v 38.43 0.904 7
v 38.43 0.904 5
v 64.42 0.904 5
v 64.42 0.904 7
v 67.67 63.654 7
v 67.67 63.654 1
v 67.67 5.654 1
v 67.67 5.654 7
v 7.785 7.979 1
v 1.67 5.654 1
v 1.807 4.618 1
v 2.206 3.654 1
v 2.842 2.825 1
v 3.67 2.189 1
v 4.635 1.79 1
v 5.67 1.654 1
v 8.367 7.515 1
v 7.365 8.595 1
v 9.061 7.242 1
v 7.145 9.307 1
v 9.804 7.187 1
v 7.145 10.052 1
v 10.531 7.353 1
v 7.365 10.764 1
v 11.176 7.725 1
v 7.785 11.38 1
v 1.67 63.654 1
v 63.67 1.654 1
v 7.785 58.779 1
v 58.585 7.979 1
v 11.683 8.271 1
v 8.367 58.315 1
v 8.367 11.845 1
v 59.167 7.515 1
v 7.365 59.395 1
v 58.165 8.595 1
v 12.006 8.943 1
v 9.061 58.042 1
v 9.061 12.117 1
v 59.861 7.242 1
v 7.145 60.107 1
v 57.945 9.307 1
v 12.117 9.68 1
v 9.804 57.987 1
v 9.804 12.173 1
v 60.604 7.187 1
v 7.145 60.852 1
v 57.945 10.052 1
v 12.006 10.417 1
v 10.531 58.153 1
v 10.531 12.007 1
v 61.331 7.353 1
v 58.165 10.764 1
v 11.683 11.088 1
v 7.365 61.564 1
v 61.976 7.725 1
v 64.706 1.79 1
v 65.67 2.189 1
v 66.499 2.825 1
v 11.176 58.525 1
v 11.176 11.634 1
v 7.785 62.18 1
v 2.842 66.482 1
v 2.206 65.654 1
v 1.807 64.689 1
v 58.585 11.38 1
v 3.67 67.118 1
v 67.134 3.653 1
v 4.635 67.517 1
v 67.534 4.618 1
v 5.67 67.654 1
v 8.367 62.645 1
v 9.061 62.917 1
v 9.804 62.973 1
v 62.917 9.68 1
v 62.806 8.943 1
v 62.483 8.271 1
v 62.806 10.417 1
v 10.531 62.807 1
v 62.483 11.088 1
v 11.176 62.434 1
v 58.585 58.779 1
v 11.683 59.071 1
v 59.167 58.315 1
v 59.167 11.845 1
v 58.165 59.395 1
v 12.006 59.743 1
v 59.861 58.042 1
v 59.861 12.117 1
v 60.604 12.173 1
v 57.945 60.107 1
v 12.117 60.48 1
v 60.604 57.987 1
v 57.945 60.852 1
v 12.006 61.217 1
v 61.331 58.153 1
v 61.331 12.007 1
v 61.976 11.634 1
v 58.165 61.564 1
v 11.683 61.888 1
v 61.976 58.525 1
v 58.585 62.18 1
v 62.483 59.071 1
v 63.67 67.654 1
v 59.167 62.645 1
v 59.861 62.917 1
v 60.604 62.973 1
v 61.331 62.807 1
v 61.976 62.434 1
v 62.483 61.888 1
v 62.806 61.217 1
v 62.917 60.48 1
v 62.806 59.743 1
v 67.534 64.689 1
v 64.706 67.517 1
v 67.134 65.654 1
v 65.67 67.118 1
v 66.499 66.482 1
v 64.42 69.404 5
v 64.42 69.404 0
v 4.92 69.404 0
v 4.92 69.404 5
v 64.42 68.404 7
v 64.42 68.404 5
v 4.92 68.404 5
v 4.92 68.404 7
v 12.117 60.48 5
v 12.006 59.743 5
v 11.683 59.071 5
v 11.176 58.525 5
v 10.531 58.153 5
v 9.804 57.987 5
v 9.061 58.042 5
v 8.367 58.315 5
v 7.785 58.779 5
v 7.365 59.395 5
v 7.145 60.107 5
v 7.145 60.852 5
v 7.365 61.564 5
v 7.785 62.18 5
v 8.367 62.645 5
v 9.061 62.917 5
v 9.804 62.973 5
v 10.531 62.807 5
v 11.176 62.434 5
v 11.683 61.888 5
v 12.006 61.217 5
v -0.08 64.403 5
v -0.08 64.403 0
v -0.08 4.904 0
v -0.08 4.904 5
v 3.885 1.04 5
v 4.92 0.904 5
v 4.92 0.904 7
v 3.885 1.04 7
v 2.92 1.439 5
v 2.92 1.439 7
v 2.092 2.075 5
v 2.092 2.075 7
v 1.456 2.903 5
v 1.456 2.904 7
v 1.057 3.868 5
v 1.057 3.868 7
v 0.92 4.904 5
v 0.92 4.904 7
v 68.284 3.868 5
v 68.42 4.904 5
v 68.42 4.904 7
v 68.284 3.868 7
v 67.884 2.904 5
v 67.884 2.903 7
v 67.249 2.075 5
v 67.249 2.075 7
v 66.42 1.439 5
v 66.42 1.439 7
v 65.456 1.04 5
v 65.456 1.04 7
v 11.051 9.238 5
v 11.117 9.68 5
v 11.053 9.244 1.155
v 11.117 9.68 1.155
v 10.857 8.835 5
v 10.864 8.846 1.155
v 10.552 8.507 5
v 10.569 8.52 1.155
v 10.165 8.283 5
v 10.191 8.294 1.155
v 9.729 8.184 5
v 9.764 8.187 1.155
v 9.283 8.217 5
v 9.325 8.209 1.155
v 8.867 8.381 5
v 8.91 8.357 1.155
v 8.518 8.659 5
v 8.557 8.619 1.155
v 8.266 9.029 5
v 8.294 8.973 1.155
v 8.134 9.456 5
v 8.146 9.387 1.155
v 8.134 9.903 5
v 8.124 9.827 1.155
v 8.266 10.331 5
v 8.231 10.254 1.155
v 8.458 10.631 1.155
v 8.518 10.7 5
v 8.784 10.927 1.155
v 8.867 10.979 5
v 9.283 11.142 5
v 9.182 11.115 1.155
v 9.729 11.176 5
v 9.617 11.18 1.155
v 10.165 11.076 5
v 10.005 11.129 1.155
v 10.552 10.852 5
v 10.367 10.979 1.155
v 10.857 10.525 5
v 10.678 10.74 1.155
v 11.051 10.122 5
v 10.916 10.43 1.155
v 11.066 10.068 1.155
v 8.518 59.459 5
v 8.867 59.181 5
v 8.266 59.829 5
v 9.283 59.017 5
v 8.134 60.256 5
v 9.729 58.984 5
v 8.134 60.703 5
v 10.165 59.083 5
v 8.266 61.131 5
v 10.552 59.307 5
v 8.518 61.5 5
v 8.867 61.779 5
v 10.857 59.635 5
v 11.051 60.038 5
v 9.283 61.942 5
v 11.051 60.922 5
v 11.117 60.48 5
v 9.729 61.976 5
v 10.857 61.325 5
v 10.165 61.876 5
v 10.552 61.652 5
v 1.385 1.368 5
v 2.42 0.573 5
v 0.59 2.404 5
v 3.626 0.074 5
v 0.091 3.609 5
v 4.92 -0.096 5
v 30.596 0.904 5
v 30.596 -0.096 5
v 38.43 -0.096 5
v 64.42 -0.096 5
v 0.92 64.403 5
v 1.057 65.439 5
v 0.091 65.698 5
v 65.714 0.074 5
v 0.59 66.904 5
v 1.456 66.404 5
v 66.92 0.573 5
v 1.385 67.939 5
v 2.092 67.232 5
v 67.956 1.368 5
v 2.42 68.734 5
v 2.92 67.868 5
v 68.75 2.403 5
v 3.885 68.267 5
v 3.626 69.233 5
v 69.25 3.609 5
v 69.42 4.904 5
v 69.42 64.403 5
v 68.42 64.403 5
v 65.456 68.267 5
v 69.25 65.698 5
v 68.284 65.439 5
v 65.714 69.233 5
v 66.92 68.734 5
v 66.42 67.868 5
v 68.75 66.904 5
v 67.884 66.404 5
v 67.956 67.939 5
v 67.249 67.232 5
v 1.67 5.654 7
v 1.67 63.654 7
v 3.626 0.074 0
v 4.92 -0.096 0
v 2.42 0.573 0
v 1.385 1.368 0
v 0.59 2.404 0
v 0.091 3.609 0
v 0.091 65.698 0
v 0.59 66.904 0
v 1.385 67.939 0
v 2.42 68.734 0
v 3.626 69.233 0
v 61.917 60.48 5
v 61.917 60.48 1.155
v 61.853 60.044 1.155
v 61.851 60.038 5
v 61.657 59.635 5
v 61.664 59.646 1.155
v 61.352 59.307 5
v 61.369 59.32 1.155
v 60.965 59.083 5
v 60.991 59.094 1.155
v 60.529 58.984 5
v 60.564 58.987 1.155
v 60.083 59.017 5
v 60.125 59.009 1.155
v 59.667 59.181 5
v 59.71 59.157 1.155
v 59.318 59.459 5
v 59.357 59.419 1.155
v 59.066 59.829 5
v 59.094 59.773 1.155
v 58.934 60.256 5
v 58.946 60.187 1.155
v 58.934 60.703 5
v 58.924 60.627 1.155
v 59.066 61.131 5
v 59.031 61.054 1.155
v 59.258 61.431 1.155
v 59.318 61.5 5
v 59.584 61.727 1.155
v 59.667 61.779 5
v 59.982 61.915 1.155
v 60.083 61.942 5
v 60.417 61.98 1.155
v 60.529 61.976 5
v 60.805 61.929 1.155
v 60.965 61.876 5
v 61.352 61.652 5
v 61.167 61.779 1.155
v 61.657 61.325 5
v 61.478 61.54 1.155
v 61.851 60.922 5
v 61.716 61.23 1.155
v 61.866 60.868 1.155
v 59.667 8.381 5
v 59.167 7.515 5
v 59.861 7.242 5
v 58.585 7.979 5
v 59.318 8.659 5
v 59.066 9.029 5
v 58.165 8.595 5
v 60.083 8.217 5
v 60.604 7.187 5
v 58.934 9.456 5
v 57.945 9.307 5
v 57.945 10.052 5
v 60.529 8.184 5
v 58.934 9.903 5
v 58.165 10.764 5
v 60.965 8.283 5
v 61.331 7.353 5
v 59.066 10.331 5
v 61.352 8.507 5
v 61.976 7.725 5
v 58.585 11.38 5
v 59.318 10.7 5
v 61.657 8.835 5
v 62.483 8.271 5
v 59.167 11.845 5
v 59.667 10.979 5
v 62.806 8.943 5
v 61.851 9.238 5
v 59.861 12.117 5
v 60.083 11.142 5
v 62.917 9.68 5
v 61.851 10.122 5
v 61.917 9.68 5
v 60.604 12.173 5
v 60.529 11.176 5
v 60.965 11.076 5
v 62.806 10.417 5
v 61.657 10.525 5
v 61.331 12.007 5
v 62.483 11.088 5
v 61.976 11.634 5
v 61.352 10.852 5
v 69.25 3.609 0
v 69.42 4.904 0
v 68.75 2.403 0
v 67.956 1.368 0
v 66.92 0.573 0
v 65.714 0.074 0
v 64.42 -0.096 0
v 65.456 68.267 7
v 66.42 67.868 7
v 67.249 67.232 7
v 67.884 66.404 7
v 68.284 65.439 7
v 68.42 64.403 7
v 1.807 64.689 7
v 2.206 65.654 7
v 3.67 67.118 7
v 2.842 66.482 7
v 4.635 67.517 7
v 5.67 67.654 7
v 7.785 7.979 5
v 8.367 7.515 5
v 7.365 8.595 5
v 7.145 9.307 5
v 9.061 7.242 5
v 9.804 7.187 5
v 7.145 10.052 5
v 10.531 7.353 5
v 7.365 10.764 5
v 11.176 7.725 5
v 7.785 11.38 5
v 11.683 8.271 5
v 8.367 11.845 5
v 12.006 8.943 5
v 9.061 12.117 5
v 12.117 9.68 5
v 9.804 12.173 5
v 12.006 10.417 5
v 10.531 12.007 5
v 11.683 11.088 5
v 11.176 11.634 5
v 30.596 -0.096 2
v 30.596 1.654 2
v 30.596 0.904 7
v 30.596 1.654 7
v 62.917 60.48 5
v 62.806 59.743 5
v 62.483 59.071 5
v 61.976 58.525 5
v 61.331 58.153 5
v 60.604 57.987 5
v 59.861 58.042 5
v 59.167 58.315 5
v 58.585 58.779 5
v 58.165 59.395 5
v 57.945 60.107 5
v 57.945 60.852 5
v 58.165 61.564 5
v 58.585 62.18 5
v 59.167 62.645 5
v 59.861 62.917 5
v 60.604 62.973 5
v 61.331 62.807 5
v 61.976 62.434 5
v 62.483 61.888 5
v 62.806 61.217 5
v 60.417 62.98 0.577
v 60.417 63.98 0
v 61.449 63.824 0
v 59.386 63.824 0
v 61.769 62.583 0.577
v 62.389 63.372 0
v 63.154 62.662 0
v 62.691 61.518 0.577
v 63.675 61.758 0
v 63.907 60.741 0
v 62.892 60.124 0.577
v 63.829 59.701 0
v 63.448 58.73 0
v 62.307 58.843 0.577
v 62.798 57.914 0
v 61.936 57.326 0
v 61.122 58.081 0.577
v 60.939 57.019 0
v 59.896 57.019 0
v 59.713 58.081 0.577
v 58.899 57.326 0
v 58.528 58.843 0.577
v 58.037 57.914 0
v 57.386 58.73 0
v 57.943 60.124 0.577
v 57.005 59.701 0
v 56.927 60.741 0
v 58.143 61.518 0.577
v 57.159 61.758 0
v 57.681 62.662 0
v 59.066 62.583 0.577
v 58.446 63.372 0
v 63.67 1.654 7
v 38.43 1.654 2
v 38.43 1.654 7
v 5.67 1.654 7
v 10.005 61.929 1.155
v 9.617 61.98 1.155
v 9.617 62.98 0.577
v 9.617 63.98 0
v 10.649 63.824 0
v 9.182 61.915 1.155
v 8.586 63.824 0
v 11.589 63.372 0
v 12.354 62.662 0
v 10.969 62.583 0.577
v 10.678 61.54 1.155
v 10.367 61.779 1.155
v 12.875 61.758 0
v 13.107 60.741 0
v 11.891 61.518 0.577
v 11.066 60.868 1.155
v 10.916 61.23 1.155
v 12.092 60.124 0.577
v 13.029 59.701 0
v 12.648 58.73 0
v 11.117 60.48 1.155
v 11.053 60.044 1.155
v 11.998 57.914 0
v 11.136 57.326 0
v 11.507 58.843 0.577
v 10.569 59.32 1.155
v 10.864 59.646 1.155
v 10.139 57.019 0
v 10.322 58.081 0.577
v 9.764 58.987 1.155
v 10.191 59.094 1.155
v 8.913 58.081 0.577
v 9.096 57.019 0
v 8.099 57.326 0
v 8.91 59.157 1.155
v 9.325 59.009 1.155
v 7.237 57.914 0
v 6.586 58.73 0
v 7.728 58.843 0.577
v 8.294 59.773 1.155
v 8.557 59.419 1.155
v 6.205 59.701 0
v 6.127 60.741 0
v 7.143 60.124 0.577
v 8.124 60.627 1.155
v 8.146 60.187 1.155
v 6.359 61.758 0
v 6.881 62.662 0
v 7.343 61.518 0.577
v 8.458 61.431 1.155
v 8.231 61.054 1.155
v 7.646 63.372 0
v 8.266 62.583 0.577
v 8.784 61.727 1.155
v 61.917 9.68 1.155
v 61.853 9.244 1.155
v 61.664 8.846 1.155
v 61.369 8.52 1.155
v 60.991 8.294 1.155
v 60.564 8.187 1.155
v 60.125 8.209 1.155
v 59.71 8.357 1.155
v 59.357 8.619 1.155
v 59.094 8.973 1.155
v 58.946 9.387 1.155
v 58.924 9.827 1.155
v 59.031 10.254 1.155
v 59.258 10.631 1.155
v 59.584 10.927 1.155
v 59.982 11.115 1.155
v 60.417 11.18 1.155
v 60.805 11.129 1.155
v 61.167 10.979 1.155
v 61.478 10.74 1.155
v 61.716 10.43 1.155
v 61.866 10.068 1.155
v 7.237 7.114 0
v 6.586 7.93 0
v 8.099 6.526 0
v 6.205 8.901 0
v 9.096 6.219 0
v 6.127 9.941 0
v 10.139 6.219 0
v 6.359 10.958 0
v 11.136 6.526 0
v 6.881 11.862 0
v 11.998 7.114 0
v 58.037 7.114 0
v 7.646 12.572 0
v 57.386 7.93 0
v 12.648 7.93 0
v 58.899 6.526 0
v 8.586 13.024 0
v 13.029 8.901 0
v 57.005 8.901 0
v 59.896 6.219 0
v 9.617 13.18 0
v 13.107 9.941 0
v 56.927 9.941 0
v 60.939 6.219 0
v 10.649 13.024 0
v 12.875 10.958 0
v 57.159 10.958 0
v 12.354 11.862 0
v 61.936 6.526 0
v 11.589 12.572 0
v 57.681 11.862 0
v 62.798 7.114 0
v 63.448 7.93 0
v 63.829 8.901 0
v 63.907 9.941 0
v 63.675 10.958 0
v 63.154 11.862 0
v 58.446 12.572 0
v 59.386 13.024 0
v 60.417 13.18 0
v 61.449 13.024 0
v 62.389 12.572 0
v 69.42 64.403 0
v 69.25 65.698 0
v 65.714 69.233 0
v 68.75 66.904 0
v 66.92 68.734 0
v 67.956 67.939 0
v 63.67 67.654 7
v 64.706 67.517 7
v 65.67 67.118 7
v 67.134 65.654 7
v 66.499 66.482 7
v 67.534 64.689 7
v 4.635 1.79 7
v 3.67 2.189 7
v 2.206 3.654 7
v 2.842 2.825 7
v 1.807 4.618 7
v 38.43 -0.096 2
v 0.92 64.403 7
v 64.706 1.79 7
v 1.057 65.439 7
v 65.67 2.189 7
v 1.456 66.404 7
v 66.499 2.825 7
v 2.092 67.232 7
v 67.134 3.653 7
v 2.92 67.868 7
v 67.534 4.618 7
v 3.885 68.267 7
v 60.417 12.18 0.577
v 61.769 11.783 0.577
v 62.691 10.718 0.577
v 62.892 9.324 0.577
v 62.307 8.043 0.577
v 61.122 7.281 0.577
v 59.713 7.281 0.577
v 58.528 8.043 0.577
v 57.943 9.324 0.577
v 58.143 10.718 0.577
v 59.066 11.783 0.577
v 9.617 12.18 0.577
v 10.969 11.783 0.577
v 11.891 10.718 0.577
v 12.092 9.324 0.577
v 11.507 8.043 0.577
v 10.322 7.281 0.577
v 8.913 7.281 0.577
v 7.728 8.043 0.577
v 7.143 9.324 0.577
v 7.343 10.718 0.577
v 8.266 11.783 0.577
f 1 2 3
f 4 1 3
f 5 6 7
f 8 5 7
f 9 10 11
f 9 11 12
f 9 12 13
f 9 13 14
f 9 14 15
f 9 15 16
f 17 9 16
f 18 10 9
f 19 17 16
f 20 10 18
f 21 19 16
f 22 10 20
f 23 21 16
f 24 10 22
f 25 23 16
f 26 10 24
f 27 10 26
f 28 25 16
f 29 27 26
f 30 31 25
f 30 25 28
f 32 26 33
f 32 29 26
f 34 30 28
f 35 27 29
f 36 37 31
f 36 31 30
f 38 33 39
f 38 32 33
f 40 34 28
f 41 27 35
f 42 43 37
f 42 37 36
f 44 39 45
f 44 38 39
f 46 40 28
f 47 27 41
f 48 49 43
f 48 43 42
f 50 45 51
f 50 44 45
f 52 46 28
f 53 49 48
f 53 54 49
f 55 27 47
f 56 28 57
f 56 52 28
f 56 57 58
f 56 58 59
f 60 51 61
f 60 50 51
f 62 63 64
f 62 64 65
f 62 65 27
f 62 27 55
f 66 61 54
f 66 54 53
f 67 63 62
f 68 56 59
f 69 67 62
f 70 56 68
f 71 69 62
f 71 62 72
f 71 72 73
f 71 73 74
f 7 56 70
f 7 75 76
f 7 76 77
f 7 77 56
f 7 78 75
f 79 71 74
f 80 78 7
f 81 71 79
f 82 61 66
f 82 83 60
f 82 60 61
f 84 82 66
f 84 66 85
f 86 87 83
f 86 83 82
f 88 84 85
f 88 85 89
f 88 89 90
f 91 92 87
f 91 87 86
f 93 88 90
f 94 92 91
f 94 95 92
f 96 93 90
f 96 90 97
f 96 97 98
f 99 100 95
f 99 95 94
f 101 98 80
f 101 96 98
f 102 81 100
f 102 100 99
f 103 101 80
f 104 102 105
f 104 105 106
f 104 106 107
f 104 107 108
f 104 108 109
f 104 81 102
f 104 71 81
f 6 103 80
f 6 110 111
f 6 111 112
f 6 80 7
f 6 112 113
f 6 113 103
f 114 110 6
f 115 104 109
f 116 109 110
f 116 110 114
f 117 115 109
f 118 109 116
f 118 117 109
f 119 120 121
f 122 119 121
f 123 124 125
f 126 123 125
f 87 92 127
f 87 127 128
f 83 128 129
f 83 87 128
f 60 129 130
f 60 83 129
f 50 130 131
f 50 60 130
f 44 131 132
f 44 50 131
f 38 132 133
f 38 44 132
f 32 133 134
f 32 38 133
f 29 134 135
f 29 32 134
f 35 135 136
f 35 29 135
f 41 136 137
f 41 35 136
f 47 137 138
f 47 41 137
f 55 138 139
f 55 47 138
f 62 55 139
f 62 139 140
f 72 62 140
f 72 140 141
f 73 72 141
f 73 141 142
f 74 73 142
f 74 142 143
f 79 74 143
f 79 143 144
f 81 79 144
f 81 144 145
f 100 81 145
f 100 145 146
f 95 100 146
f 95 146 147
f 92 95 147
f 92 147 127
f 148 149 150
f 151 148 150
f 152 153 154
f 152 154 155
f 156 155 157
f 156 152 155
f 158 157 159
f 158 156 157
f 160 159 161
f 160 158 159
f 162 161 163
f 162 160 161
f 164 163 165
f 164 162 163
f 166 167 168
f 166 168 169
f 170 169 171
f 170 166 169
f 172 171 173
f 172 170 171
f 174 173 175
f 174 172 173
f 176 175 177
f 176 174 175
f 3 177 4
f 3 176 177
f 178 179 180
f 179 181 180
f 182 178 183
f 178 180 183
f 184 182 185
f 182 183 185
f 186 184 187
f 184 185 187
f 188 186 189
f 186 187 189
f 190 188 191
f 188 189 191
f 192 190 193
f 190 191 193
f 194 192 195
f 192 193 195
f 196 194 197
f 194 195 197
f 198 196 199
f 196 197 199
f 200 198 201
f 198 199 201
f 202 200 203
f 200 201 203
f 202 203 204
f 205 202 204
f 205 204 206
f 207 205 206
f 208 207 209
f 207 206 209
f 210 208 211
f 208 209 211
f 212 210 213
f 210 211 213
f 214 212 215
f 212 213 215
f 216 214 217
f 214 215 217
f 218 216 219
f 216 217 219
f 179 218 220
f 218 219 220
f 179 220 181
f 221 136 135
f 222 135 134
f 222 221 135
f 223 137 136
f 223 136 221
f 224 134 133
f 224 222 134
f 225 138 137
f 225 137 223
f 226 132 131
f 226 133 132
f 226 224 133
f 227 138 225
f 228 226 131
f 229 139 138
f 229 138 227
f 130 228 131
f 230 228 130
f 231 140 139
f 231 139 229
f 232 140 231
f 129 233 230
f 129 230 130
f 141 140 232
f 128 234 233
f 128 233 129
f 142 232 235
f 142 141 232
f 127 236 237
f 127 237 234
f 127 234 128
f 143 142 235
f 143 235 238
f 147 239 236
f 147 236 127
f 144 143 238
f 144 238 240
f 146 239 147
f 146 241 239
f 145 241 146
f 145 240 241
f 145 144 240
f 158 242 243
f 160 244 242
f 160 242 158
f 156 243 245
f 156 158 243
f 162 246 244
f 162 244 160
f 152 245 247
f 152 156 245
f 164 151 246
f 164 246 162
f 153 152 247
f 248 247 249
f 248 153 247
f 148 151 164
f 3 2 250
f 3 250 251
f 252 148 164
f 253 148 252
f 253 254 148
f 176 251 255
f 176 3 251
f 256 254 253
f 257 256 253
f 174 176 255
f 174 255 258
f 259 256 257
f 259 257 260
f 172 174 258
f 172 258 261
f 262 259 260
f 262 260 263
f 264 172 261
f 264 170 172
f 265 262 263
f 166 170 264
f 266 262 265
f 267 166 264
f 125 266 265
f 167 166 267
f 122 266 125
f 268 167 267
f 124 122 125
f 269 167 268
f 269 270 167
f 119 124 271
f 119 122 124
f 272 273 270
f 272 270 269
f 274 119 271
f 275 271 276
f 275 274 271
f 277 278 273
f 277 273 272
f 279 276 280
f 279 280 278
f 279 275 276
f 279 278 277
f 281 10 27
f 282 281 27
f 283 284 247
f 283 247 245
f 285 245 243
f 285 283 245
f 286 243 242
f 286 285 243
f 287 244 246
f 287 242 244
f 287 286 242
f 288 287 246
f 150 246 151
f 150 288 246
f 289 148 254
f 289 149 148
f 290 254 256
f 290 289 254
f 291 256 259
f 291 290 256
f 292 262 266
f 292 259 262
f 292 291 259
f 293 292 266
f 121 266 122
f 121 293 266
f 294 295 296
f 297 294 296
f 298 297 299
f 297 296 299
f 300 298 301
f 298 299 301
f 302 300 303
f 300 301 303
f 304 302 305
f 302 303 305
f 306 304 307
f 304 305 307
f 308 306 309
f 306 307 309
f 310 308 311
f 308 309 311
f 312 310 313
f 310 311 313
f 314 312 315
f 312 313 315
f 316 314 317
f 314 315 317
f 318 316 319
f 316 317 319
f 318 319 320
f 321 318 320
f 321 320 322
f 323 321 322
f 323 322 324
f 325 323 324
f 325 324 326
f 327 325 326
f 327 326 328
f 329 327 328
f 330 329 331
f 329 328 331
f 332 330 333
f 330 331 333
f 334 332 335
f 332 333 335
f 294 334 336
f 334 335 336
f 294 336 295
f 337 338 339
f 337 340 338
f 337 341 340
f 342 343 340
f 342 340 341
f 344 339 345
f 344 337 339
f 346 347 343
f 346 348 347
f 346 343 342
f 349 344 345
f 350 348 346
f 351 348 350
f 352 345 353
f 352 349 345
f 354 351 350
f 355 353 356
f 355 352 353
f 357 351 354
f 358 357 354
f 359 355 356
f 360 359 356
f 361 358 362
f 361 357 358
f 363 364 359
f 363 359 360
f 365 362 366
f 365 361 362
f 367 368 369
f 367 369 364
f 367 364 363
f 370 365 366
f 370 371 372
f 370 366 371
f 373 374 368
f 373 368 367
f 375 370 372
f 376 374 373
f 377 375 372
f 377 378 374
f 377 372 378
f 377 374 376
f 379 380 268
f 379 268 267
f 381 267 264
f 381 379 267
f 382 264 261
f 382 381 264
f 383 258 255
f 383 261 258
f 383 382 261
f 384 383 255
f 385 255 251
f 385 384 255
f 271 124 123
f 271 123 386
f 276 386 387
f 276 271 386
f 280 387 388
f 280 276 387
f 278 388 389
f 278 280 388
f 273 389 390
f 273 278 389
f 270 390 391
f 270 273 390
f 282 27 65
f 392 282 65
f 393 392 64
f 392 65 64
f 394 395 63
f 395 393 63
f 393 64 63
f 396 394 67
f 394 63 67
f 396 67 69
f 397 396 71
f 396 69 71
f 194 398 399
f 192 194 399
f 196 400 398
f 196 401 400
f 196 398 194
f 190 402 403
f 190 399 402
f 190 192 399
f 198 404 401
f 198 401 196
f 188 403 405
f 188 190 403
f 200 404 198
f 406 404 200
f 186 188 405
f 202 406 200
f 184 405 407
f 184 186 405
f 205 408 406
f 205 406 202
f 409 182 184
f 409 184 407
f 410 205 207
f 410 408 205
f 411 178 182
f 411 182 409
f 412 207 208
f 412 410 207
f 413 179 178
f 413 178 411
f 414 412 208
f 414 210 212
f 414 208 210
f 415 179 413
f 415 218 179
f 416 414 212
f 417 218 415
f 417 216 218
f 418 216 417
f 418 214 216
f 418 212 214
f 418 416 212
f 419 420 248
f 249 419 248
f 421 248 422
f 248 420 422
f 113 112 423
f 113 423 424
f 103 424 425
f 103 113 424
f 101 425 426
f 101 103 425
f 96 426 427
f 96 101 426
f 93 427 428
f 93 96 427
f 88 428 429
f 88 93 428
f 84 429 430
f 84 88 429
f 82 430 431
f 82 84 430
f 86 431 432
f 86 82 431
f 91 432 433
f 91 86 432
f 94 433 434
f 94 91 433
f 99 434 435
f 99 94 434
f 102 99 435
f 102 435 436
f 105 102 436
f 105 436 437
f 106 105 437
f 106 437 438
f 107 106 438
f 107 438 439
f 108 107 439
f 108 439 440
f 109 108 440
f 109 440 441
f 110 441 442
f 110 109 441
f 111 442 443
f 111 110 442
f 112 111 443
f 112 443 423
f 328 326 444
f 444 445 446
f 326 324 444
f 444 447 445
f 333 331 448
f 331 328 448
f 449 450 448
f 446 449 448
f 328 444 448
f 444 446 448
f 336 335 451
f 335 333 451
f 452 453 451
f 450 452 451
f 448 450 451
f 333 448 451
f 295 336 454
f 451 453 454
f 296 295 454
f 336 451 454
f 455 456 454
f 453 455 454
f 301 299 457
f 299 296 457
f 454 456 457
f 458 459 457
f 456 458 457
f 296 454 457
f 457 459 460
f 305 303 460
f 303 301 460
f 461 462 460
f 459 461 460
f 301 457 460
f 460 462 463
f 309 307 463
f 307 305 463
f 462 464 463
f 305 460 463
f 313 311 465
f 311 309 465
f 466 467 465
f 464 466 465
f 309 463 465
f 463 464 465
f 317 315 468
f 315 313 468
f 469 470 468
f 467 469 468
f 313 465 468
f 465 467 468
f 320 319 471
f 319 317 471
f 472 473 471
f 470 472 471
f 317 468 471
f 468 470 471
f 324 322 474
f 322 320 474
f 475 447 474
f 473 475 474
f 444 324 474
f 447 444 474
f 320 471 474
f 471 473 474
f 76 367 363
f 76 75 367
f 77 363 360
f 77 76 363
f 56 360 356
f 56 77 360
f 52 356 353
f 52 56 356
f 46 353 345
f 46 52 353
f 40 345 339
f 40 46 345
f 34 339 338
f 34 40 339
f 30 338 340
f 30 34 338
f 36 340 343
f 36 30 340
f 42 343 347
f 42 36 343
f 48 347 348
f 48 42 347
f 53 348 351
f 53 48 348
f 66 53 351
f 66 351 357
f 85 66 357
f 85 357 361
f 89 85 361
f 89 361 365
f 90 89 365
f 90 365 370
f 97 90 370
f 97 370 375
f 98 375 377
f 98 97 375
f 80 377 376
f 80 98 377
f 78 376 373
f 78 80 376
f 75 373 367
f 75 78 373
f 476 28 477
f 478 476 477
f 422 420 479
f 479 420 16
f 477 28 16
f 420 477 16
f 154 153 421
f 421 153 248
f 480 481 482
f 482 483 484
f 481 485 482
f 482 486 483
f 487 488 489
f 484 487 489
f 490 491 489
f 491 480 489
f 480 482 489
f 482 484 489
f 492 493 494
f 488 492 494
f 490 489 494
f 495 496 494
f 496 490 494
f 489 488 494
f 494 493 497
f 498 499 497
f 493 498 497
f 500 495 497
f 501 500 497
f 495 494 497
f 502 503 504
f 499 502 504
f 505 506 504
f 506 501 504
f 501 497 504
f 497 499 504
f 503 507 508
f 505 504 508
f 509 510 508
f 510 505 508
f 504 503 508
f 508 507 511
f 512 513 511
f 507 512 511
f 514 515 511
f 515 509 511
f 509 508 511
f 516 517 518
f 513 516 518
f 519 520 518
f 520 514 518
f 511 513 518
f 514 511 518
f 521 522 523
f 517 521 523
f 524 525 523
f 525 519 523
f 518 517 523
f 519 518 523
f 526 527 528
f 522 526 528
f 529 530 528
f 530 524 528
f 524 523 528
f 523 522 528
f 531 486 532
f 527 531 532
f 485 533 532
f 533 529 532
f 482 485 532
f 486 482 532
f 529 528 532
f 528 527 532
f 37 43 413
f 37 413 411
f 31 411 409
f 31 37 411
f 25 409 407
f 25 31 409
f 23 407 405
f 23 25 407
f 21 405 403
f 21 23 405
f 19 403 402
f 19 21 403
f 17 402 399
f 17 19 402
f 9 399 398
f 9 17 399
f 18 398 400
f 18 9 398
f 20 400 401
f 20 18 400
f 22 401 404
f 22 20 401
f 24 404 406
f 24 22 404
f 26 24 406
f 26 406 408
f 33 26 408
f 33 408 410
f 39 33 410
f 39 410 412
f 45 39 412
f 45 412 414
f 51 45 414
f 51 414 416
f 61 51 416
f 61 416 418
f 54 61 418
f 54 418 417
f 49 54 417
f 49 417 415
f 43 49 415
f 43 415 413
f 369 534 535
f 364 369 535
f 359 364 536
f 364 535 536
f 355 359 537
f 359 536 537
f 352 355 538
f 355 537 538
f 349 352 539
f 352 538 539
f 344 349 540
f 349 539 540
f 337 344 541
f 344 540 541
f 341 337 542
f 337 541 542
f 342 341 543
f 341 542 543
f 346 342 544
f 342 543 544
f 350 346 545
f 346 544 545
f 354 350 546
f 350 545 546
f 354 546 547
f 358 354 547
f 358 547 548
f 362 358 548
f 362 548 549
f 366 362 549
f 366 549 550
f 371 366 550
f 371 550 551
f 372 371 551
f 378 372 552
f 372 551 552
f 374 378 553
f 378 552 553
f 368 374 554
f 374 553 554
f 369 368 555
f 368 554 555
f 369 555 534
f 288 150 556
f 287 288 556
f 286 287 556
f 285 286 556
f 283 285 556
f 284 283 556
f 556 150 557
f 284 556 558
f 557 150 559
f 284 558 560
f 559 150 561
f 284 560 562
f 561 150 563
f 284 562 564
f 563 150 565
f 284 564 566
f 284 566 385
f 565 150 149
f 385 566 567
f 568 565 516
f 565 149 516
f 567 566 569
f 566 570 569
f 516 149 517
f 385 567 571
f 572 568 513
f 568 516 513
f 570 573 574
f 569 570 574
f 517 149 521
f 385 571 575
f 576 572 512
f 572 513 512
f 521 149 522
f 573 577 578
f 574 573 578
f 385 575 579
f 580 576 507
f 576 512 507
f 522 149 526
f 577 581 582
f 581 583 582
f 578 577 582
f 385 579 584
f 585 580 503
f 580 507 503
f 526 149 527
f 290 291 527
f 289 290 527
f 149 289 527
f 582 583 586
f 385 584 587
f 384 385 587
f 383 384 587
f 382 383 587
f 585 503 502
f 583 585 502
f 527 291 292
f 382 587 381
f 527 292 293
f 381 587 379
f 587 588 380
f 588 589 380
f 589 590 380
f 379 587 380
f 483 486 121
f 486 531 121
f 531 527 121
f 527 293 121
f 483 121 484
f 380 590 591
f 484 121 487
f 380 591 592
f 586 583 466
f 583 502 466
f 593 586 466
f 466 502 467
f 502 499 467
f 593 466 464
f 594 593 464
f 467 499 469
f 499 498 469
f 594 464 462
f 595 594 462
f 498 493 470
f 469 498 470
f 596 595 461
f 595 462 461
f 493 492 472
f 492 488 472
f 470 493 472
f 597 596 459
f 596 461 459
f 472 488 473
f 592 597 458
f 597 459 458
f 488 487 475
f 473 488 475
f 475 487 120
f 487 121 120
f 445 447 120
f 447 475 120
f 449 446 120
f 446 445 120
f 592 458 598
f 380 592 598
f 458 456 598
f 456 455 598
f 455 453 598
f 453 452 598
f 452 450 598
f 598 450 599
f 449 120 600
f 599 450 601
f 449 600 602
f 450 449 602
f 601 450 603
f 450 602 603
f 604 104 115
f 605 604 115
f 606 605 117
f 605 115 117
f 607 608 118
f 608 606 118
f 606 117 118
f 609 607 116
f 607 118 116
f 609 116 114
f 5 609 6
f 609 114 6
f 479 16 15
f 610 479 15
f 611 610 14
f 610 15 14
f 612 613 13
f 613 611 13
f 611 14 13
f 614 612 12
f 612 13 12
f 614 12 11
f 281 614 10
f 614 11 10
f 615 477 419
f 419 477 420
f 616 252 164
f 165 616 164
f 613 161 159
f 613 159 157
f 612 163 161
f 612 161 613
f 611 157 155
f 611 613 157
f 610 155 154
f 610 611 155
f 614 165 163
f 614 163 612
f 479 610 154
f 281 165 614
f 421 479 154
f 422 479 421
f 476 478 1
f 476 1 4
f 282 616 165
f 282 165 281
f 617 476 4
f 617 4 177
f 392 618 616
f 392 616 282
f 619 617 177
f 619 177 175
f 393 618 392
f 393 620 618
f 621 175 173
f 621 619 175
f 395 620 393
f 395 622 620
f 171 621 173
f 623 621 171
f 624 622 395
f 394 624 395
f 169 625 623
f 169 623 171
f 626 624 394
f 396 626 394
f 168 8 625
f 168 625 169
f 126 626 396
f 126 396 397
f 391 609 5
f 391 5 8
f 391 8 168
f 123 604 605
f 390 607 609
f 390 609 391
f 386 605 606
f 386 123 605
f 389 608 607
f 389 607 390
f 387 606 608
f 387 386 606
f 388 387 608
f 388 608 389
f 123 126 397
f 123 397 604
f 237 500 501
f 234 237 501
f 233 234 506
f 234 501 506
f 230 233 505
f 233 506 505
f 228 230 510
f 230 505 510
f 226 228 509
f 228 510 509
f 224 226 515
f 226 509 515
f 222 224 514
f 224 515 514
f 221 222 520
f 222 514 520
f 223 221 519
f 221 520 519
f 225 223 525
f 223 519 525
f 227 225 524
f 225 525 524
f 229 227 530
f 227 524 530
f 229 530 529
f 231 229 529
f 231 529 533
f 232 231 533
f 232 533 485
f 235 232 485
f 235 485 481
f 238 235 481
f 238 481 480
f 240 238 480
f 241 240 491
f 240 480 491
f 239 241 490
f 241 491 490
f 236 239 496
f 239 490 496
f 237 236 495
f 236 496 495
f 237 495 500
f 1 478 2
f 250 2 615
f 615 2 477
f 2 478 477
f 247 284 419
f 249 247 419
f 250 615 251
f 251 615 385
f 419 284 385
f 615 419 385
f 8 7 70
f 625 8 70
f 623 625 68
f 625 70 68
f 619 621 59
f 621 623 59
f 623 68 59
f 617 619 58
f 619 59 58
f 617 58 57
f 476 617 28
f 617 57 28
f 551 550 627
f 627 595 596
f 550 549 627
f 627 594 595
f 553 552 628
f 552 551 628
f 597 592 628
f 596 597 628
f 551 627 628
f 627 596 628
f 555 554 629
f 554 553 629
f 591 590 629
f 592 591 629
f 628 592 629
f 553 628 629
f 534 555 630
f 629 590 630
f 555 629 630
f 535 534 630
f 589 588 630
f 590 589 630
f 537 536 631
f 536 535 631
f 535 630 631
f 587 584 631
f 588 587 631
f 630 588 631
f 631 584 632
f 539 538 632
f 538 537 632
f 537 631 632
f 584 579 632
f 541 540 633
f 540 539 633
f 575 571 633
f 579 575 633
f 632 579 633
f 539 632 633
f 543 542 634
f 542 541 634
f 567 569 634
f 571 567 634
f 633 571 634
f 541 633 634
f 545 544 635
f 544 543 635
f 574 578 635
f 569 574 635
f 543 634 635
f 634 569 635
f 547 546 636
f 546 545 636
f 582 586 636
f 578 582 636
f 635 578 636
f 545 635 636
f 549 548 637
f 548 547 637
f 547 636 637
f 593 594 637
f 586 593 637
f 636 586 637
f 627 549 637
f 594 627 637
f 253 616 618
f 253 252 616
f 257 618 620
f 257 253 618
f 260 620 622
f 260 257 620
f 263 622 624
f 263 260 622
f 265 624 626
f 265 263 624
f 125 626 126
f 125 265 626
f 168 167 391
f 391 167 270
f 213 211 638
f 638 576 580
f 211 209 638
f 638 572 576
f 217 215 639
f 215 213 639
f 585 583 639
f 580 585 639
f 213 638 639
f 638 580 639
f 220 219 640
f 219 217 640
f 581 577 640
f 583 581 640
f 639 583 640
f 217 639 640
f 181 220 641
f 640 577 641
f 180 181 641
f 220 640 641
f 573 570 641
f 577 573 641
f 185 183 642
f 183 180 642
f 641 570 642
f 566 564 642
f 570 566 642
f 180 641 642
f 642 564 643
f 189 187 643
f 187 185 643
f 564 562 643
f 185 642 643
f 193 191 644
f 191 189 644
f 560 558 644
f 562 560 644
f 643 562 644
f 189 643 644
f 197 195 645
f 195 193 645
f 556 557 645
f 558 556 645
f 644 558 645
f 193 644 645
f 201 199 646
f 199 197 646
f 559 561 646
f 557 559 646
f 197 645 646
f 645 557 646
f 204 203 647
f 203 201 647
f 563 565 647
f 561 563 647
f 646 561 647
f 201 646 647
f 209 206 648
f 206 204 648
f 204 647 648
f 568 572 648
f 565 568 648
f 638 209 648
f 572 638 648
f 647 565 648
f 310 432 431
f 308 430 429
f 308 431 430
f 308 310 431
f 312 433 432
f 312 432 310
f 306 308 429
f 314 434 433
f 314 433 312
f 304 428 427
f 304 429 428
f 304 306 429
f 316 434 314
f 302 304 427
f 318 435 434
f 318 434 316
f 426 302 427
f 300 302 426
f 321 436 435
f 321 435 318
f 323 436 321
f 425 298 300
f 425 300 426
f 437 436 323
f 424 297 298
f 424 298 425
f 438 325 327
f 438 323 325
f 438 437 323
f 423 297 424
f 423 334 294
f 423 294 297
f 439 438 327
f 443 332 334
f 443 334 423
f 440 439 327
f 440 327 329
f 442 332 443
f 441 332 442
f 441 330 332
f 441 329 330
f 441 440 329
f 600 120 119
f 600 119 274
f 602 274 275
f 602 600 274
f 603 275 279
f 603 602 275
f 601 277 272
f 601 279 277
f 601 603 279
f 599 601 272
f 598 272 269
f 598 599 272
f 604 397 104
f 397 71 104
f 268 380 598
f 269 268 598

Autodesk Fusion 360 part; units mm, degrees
sketch "Sketch2" plane through (0, 1.6535, 0) normal (0, 1, 0) x (-1, 0, 0)
  line L0 (-63.6703, 1) -> (-5.6703, 1)
  line L1 (-5.6703, 1) -> (-5.6703, 7)
  line L2 (-5.6703, 7) -> (-63.6703, 7)
  line L3 (-63.6703, 7) -> (-63.6703, 1)
  line L4 (-30.5955, 7) -> (-38.4299, 7)
  line L5 (-38.4299, 7) -> (-38.4299, 2)
  line L6 (-38.4299, 2) -> (-30.5955, 2)
  line L7 (-30.5955, 2) -> (-30.5955, 7)
  dimension "d1" = 5
sketch "Sketch3" plane through (0, 0, 1) normal (0, 0, 1) x (1, 0, 0)
  circle A0 centre (9.6172, 60.4797) radius 2.5
  circle A1 centre (60.4172, 9.6797) radius 2.5
  circle A2 centre (9.6172, 9.6797) radius 2.5
  circle A3 centre (60.4172, 60.4797) radius 2.5
  line L0 (68.4203, 4.9035) -> (68.4203, 64.4035)
  arc A4 (68.4203, 64.4035) -> (64.4203, 68.4035) centre (64.4203, 64.4035) ccw
  line L1 (64.4203, 68.4035) -> (4.9203, 68.4035)
  arc A5 (4.9203, 68.4035) -> (0.9203, 64.4035) centre (4.9203, 64.4035) ccw
  line L2 (0.9203, 64.4035) -> (0.9203, 4.9035)
  arc A6 (0.9203, 4.9035) -> (4.9203, 0.9035) centre (4.9203, 4.9035) ccw
  line L3 (4.9203, 0.9035) -> (64.4203, 0.9035)
  arc A7 (64.4203, 0.9035) -> (68.4203, 4.9035) centre (64.4203, 4.9035) ccw
  line L4 (5.6703, 67.6535) -> (63.6703, 67.6535)
  line L5 (67.6703, 63.6535) -> (67.6703, 5.6535)
  line L6 (63.6703, 1.6535) -> (5.6703, 1.6535)
  line L7 (1.6703, 5.6535) -> (1.6703, 63.6535)
  arc A8 (5.6703, 67.6535) -> (1.6703, 63.6535) centre (5.6703, 63.6535) ccw
  arc A9 (67.6703, 63.6535) -> (63.6703, 67.6535) centre (63.6703, 63.6535) ccw
  arc A10 (63.6703, 1.6535) -> (67.6703, 5.6535) centre (63.6703, 5.6535) ccw
  arc A11 (1.6703, 5.6535) -> (5.6703, 1.6535) centre (5.6703, 5.6535) ccw
  dimension "d2" = 4
  dimension "d3" = 0.75
  dimension "d4" = 0.75
  dimension "d5" = 0.75
  dimension "d6" = 0.75
sketch "Sketch1" plane through (0, 0, 0) normal (0, 0, 1) x (1, 0, 0)
  circle A0 centre (9.6172, 9.6797) radius 1.5
  circle A1 centre (60.4172, 9.6797) radius 1.5
  arc A2 (4.9203, 69.4035) -> (-0.0797, 64.4035) centre (4.9203, 64.4035) ccw
  arc A3 (64.4203, -0.0965) -> (69.4203, 4.9035) centre (64.4203, 4.9035) ccw
  circle A4 centre (60.4172, 60.4797) radius 1.5
  line L0 (-6, 9.6797) -> (72, 9.6797) construction
  line L1 (35.0172, 92) -> (35.0172, -8) construction
  line L2 (64.4203, 69.4035) -> (4.9203, 69.4035)
  line L3 (60.4172, -4) -> (60.4172, 71) construction
  line L4 (-7, 60.4797) -> (90.0735, 60.4797) construction
  arc A5 (69.4203, 64.4035) -> (64.4203, 69.4035) centre (64.4203, 64.4035) ccw
  line L5 (4.9203, -0.0965) -> (64.4203, -0.0965)
  line L6 (-7, 66.8297) -> (83, 66.8297) construction
  arc A6 (-0.0797, 4.9035) -> (4.9203, -0.0965) centre (4.9203, 4.9035) ccw
  line L7 (-0.0797, 64.4035) -> (-0.0797, 4.9035)
  line L8 (-5, 3.3297) -> (86.8002, 3.3297) construction
  line L9 (9.6172, 82) -> (9.6172, -14) construction
  line L10 (69.4203, 4.9035) -> (69.4203, 64.4035)
  circle A7 centre (9.6172, 60.4797) radius 1.5
  point P0 (2.2672, 67.8297)
  point P1 (67.7672, 67.8297)
  point P2 (69.4203, -0.0965)
  point P3 (69.4203, 69.4035)
  point P4 (-0.0797, 69.4035)
  dimension "d138" = 69.5
  dimension "d139" = 69.5
  dimension "d140" = 65.5
  dimension "d143" = 6.35
  dimension "d144" = 6.35
  dimension "d156" = 3
  dimension "d158" = 3
  dimension "d160" = 3
  dimension "d162" = 3
  dimension "d164" = 5
  dimension "d165" = 5
  dimension "d166" = 5
  dimension "d167" = 5
extrude "Extrude1" add sketch "Sketch1" along normal blind 5
shell "Shell1" thickness 1 removed faces 1 at (26.9171, 26.9532, 5)
extrude "Extrude3" add sketch "Sketch3" along normal blind 6 contours L0 A4 L1 A5 L2 A6 L3 A7
hole "Hole2" at (60.4172, 60.4797, 0) direction (0, 0, 1) diameter 3 depth 3 tip angle 118 countersink diameter 7 countersink angle 120
hole "Hole10" at (60.4172, 9.6797, 0) direction (0, 0, 1) diameter 3 depth 2.75 tip angle 118 countersink diameter 7 countersink angle 120
hole "Hole11" at (9.6172, 9.6797, 0) direction (0, 0, 1) diameter 3 depth 2.75 tip angle 118 countersink diameter 7 countersink angle 120
hole "Hole12" at (9.6172, 60.4797, 0) direction (0, 0, 1) diameter 3 depth 2.75 tip angle 118 countersink diameter 7 countersink angle 120
extrude "Extrude4" cut sketch "Sketch2" against normal blind 2 contours L2 L4 L5 L6 L7
equation "d143 = mount_post_offset"
equation "d144 = mount_post_offset"
equation "d156 = mount_post_pcb_holder"
equation "d158 = mount_post_pcb_holder"
equation "d160 = mount_post_pcb_holder"
equation "d162 = mount_post_pcb_holder"
equation "d164 = shell_corner_radius"
equation "d165 = shell_corner_radius"
equation "d166 = shell_corner_radius"
equation "d167 = shell_corner_radius"
equation "mount_post_offset = 6.35 mm"
equation "mount_post_pcb_holder = 3 mm"
equation "shell_corner_radius = 5 mm"
